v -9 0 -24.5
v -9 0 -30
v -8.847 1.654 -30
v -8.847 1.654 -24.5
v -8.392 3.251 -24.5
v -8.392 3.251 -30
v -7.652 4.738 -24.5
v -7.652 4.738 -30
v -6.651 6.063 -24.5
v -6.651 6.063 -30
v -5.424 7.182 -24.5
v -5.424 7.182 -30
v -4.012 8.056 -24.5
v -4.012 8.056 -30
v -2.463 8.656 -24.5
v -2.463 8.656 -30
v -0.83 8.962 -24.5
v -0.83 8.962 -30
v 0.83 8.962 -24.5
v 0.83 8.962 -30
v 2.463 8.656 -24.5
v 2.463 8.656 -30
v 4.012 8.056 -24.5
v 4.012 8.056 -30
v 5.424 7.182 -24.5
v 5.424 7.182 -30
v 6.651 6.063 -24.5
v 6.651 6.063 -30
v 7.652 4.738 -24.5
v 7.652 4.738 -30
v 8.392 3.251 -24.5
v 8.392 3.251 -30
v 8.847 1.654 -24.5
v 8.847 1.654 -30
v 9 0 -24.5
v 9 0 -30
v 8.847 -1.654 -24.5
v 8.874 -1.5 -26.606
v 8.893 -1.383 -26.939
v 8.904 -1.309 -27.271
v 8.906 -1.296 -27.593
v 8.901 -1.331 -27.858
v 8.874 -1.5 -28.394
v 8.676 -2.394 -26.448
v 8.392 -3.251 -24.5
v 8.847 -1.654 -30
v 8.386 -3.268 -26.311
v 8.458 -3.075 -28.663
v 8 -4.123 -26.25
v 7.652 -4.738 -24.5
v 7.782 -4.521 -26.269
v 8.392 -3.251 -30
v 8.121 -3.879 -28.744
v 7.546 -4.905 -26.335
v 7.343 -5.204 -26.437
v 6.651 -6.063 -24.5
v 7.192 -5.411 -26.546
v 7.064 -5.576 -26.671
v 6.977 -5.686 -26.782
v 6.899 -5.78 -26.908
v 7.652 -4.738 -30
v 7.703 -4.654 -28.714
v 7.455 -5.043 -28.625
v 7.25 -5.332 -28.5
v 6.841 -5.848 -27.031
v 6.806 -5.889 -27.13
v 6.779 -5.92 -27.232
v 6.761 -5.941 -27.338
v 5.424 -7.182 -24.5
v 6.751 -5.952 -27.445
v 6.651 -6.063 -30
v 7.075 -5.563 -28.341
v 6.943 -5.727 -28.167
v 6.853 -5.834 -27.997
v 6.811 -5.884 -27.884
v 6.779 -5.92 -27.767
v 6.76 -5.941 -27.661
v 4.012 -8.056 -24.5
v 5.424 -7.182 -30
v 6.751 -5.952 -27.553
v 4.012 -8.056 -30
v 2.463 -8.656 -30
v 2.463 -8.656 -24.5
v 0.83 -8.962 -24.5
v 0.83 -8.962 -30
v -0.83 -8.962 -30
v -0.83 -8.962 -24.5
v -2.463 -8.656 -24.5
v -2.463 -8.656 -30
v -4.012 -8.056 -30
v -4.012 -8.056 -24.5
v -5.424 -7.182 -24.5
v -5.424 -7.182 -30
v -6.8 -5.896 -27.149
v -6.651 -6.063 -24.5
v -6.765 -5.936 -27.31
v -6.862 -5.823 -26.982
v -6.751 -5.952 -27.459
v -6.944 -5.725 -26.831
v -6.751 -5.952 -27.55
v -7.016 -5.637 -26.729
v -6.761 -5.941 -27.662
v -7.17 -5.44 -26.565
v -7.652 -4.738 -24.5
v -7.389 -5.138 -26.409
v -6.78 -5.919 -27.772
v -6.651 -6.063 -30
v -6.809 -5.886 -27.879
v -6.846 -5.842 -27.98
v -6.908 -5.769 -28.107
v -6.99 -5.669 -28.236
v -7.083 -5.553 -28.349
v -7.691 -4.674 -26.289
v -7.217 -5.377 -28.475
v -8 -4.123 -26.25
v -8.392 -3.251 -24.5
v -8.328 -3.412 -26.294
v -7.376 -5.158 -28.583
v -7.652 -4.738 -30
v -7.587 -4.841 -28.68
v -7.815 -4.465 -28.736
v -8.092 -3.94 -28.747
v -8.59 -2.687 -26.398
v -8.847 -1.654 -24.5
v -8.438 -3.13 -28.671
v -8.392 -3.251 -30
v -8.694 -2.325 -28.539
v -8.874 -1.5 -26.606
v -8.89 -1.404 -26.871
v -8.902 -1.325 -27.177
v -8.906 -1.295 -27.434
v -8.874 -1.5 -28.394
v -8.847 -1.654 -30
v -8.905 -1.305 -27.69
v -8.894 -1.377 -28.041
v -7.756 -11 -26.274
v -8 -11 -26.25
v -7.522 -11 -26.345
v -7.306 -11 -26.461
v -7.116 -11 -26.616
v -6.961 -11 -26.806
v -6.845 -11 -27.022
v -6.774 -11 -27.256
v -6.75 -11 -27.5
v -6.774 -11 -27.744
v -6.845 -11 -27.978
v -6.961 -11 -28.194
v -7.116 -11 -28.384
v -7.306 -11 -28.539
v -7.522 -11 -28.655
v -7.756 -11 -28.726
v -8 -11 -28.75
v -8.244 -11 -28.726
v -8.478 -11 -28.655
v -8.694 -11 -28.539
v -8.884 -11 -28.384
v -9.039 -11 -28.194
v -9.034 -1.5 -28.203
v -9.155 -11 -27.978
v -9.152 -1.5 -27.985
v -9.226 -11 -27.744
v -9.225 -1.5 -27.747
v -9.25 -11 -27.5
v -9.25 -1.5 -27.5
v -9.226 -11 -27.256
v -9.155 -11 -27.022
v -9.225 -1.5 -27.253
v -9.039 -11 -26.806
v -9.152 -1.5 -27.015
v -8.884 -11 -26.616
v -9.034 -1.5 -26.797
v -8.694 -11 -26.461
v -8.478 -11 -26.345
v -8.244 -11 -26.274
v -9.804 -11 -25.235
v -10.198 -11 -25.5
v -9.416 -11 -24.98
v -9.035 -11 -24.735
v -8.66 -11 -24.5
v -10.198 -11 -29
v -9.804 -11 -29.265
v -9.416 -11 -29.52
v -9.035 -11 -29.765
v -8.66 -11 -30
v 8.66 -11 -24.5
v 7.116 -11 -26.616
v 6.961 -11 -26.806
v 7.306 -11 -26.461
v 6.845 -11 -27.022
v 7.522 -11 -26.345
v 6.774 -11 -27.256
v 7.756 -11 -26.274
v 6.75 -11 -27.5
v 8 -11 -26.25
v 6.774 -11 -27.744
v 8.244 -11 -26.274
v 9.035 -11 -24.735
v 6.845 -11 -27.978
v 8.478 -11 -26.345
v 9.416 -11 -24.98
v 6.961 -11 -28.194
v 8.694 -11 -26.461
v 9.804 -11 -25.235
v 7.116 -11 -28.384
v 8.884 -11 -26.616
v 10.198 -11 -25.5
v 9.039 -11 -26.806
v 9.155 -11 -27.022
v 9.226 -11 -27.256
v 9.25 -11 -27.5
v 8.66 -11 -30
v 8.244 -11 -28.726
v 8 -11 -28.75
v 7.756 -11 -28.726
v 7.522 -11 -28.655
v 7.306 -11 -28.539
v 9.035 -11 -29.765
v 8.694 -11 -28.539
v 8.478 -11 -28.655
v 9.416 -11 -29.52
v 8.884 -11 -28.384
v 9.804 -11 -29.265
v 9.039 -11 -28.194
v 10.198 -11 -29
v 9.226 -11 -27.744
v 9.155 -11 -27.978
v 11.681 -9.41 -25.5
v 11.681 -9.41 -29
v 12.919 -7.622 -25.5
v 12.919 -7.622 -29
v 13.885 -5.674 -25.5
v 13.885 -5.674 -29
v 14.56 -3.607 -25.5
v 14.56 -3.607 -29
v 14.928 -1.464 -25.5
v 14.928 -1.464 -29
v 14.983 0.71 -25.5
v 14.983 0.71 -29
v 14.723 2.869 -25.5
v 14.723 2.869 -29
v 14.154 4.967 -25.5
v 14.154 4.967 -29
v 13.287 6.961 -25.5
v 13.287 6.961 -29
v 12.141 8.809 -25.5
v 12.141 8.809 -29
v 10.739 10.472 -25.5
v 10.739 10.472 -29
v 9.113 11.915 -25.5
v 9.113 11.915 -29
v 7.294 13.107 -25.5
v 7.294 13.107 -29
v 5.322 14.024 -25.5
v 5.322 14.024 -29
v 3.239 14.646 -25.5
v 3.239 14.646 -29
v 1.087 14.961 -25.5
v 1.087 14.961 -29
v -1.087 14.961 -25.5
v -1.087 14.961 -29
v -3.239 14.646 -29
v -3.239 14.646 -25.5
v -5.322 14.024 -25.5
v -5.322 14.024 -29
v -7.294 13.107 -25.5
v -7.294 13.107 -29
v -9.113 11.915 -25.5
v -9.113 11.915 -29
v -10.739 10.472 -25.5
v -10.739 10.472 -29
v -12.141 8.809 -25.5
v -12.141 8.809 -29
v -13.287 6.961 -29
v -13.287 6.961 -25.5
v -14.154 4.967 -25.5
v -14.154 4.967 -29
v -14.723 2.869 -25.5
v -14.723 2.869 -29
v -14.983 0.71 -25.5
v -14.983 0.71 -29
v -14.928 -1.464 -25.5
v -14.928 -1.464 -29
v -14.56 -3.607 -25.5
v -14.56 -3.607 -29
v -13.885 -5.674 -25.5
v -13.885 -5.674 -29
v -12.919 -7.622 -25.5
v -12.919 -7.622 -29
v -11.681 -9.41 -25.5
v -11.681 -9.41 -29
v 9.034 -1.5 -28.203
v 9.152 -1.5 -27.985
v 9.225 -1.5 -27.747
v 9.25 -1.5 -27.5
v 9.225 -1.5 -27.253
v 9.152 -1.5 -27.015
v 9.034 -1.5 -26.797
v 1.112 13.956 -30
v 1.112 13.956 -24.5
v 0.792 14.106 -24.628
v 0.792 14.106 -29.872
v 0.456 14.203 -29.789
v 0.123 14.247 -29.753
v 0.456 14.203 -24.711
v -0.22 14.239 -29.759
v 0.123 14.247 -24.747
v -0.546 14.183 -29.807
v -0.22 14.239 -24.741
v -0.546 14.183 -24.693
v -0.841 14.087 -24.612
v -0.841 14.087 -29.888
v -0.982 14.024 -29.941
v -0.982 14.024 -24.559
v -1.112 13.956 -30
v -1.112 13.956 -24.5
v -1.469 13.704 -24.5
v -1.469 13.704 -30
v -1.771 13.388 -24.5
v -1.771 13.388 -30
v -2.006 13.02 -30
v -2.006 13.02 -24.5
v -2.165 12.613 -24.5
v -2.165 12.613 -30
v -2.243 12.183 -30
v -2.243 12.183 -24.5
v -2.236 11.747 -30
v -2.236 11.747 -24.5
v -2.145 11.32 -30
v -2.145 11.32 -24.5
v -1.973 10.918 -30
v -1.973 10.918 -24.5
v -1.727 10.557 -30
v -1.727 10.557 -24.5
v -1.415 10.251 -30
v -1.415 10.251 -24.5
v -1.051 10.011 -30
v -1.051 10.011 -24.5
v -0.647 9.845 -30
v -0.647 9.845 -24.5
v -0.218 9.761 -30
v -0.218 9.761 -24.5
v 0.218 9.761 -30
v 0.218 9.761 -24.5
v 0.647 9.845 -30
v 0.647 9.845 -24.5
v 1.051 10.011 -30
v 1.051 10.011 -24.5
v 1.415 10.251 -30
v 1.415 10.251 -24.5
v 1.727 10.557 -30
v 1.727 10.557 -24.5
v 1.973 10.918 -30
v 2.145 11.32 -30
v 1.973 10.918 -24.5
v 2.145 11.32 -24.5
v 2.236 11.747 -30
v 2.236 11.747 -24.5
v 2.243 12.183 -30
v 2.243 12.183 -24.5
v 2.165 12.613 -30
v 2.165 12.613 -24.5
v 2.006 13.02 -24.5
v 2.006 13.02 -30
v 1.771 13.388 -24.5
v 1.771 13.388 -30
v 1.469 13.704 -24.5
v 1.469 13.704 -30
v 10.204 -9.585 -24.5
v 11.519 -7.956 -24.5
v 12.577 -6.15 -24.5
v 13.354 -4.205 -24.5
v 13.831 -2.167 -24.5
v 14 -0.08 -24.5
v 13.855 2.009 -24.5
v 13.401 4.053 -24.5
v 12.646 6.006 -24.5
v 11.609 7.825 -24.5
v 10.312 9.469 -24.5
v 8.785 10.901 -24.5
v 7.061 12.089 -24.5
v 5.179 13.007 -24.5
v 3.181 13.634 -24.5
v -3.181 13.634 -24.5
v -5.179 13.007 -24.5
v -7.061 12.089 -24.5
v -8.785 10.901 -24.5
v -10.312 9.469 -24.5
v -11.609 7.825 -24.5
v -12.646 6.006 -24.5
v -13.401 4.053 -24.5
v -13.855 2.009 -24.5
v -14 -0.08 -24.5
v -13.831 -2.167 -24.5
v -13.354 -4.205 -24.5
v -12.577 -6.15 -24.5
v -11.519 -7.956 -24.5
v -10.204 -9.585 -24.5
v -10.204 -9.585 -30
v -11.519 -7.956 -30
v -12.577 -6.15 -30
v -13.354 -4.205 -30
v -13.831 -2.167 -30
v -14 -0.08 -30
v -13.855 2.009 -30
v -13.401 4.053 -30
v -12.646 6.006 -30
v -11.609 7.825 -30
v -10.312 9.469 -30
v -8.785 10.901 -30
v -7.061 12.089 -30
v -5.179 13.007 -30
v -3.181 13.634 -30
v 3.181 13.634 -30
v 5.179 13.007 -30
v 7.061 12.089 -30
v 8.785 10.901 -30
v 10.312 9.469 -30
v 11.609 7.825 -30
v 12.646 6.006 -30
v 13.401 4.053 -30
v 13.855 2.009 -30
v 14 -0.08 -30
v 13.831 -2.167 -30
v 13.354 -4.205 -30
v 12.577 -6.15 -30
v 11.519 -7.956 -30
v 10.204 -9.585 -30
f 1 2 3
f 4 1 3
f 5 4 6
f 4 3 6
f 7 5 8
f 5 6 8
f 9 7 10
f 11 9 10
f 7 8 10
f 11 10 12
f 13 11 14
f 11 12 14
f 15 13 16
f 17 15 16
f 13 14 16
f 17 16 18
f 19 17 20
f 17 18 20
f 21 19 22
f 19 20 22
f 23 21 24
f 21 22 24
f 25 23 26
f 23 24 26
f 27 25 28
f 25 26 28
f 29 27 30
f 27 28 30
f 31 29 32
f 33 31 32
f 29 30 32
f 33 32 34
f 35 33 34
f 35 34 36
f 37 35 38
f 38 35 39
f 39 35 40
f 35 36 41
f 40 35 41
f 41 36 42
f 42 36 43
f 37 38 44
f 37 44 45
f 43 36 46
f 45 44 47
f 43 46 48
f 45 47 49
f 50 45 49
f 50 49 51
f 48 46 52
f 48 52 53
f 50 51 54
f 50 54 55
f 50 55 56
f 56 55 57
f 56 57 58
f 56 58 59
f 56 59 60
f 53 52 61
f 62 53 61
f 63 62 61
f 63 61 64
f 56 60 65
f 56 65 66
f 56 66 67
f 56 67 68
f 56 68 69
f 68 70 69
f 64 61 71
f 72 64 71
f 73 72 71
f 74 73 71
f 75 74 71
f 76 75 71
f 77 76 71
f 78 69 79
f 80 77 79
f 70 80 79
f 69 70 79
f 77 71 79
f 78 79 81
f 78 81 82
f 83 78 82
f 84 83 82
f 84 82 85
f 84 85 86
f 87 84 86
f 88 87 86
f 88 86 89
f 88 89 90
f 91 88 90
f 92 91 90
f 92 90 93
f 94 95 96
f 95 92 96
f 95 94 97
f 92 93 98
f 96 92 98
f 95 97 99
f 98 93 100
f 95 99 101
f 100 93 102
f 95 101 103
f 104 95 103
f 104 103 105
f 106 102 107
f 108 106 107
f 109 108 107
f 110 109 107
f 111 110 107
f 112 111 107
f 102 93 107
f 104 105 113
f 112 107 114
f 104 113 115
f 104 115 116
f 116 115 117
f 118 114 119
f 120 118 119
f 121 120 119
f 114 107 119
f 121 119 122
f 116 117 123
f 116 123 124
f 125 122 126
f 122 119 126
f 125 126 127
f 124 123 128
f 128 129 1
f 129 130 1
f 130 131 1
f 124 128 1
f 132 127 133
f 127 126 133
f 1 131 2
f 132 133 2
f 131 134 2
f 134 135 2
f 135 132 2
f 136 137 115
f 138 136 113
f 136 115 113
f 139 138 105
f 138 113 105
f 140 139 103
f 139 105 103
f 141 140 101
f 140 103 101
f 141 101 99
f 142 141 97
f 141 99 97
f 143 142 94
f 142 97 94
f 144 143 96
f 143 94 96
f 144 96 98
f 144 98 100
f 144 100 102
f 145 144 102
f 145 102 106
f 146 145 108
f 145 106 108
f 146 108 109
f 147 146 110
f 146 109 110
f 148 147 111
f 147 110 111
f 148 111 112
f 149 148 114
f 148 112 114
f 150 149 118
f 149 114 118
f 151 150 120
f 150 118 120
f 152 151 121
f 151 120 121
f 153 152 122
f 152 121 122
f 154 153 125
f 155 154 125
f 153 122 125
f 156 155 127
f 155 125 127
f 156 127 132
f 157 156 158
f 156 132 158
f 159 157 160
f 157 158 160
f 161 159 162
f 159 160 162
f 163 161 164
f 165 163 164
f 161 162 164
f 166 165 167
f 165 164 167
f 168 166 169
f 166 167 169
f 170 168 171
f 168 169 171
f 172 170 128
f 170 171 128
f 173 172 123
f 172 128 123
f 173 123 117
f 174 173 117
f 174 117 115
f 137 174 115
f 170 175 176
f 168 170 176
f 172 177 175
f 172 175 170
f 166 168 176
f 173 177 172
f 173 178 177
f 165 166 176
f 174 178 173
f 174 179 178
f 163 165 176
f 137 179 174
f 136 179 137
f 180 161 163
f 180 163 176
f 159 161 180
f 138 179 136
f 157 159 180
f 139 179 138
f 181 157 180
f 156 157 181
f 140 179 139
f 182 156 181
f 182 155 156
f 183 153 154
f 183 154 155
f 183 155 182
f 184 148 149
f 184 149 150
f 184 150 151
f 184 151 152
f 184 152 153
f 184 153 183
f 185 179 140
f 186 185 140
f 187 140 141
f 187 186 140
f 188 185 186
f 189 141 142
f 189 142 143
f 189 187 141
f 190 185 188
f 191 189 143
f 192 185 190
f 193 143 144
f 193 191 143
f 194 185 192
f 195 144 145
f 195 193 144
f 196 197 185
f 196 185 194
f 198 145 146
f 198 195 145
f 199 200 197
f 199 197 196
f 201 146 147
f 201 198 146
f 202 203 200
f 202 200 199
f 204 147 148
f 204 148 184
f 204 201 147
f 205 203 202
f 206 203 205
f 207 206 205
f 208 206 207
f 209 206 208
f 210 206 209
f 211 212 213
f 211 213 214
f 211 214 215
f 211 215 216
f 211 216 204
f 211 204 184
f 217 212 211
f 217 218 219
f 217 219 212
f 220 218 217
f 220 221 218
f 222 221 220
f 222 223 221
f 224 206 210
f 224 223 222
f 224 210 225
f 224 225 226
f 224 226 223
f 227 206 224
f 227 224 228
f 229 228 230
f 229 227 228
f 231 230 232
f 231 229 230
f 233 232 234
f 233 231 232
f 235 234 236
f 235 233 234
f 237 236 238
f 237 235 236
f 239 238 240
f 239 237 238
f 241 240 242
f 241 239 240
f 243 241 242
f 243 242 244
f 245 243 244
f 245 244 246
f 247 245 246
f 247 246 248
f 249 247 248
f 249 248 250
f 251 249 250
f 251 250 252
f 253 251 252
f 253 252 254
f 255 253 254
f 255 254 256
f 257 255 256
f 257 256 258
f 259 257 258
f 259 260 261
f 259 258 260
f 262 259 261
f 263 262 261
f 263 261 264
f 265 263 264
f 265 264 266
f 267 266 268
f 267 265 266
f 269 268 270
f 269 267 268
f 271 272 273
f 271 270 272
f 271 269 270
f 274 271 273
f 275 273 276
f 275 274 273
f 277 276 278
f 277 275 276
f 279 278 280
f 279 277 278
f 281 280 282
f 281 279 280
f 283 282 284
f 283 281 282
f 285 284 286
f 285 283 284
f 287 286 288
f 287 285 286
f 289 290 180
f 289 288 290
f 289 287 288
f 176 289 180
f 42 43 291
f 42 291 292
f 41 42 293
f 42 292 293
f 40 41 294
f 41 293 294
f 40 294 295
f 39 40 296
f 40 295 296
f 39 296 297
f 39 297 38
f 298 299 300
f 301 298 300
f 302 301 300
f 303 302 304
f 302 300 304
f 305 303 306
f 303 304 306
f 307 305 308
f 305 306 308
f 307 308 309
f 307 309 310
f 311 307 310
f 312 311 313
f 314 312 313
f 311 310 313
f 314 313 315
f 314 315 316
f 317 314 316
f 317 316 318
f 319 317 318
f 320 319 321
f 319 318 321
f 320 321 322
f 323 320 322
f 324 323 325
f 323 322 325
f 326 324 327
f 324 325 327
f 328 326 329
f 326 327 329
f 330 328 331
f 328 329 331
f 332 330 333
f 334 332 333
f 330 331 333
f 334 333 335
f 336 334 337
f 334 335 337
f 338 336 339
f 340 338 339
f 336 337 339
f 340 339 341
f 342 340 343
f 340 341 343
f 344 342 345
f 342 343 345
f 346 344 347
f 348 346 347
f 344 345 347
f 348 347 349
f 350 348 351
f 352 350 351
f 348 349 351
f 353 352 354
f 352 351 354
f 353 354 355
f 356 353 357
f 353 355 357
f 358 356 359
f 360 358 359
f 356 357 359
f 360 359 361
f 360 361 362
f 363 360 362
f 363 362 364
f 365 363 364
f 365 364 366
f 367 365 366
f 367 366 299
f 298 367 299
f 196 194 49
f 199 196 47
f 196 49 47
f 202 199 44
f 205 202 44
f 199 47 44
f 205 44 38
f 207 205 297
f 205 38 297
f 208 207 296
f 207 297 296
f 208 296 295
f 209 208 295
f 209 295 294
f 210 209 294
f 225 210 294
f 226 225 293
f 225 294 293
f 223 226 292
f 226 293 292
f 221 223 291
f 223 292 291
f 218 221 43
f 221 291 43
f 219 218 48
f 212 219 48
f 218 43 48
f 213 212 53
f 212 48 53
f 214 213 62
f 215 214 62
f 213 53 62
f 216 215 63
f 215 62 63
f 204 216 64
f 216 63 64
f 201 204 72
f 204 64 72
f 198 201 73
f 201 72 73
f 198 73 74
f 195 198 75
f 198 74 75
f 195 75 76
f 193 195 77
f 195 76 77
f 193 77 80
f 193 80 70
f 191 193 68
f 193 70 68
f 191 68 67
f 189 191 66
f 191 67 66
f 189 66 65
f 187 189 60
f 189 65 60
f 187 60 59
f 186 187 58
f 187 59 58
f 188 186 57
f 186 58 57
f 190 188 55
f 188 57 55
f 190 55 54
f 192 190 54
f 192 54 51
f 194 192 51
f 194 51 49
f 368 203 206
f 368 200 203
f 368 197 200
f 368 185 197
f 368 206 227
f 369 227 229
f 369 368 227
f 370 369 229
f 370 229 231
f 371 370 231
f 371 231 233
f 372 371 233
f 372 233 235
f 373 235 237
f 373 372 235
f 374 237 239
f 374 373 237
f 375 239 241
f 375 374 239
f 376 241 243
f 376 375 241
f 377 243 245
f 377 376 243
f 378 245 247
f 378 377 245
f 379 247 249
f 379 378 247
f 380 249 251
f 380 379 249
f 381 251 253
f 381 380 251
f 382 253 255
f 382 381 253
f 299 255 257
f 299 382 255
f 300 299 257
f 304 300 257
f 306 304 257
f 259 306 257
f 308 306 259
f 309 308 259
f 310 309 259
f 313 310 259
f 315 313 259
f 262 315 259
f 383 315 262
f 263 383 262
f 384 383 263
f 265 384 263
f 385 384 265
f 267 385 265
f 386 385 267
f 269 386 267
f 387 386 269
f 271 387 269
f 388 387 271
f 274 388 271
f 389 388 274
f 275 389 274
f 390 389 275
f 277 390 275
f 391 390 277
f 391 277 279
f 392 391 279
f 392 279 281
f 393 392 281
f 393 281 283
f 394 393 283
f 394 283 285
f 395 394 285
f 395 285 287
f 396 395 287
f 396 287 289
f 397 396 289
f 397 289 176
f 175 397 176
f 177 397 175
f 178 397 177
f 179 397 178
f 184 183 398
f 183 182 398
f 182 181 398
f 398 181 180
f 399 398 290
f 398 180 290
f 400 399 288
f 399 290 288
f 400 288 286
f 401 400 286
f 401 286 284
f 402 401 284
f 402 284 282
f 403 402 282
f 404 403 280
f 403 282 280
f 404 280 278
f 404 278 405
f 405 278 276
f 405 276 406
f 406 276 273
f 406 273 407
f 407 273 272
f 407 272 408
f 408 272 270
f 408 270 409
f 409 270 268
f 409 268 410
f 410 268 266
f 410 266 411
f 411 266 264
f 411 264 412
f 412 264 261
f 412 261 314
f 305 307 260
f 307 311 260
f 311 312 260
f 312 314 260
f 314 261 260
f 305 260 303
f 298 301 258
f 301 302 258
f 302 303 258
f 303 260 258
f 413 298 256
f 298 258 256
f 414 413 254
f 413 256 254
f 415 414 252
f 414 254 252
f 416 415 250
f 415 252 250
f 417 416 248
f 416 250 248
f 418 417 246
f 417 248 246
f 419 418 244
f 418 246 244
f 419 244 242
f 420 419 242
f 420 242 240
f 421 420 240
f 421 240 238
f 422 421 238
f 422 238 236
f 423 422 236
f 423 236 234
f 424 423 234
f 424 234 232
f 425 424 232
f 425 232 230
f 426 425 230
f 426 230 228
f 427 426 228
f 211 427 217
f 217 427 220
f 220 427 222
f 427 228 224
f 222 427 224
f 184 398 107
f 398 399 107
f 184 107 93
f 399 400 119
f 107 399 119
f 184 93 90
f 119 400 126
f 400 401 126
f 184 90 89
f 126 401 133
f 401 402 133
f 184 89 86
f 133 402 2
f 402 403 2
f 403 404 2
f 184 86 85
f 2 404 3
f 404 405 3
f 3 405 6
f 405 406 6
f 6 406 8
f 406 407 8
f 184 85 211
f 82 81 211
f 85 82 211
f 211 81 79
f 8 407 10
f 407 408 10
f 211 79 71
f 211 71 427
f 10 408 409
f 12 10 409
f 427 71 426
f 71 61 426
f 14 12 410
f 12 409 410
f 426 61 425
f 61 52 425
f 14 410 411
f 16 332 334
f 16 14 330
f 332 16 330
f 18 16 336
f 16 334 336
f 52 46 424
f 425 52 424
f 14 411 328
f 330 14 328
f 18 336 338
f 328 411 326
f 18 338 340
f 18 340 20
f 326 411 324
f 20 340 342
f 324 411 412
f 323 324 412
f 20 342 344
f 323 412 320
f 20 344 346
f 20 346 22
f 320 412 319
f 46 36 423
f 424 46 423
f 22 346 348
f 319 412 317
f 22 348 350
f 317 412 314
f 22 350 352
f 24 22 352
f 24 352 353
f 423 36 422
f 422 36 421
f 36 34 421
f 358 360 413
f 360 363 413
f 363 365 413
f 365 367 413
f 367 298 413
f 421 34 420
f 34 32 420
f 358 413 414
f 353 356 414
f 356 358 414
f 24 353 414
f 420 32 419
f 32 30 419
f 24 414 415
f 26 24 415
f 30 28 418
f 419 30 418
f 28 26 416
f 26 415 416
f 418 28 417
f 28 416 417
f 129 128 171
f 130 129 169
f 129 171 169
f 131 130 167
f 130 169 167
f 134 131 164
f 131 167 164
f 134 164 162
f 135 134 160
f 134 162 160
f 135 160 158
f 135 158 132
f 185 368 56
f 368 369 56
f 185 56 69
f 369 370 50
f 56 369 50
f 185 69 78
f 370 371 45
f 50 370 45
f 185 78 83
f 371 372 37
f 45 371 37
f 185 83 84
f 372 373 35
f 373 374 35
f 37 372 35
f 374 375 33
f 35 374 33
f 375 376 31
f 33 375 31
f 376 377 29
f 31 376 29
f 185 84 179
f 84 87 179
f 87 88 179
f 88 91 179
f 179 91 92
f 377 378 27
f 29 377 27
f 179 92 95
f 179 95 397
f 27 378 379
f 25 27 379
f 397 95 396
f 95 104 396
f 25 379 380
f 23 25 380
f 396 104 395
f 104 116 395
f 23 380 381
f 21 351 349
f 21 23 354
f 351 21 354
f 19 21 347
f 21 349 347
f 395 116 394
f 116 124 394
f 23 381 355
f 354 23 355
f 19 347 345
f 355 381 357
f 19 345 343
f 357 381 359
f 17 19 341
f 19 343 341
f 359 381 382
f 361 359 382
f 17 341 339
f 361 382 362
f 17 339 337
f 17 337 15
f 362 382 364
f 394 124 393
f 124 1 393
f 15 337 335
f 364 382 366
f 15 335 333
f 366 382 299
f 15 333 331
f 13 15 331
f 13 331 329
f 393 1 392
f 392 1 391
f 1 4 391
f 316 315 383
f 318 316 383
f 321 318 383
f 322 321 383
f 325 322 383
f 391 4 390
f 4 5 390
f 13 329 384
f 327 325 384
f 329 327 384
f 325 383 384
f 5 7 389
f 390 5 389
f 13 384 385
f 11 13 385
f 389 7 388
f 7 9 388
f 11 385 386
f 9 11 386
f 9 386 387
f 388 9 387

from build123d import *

# Parameters (mm, degrees)
SKETCH_1_R             = 7
SKETCH_1_R_2           = 5.5
EXTRUDE_1_DEPTH        = 30
EXTRUDE_START          = -7
SKETCH_2_R             = 15
SKETCH_2_R_2           = 5.5
EXTRUDE_2_DEPTH        = 7
SKETCH_5_W             = 5.5
SKETCH_5_H             = 9
CUT_EXTRUDE_4_DEPTH    = 15
HOLE_WIZARD_M3_1_D     = 2.5
HOLE_WIZARD_M3_1_DEPTH = 9.5
HOLE_WIZARD_M3_1_TIP   = 0.751075774
FILLET_1_R             = 1
SKETCH1_R              = 7.5
EXTRUDE1_DEPTH         = 5
CHAMFER1_SIZE          = 1
SKETCH_9_R             = 18
CUT_EXTRUDE_1_DEPTH    = 55
SKETCH_10_R            = 9
CUT_EXTRUDE_2_DEPTH    = 22.914607001
CHAMFER_5_SIZE         = 1
SKETCH_11_R            = 2.25
CUT_EXTRUDE_3_DEPTH    = 5.5


with BuildPart() as part:
    # 草图1 → 拉伸1 (new, symmetric)
    with BuildSketch(Plane.XY):
        Circle(SKETCH_1_R)
        Circle(SKETCH_1_R_2, mode=Mode.SUBTRACT)
    extrude(amount=EXTRUDE_1_DEPTH, both=True)

    # 草图2 → 拉伸2 (add)
    with BuildSketch(Plane.XY.offset(30).offset(EXTRUDE_START)):
        Circle(SKETCH_2_R)
        Circle(SKETCH_2_R_2, mode=Mode.SUBTRACT)
    extrude_2 = extrude(amount=EXTRUDE_2_DEPTH)

    # 镜向1: 拉伸2 across plane
    add(extrude_2.mirror(Plane.XY))

    # 草图5 → 拉伸4 (cut, symmetric)
    with BuildSketch(Plane(origin=(0, 0, 0), x_dir=(0, 0, -1), z_dir=(1, 0, 0))):
        with Locations((-27.25, -15.5)):
            Rectangle(SKETCH_5_W, SKETCH_5_H)
        with Locations((27.25, -15.5)):
            Rectangle(SKETCH_5_W, SKETCH_5_H)
    extrude(amount=CUT_EXTRUDE_4_DEPTH, both=True, mode=Mode.SUBTRACT)

    # M3 螺纹孔1
    with Locations(Plane(origin=(-8, -11, 27.5), x_dir=(0, 0, -1), z_dir=(0, -1, 0))):
        with Locations((0, 0), (0, 16), (55, 0), (55, 16)):
            Hole(HOLE_WIZARD_M3_1_D / 2, depth=HOLE_WIZARD_M3_1_DEPTH)
            with Locations((0, 0, -(HOLE_WIZARD_M3_1_DEPTH + HOLE_WIZARD_M3_1_TIP / 2))):  # 118° drill point
                Cone(0, HOLE_WIZARD_M3_1_D / 2, HOLE_WIZARD_M3_1_TIP, mode=Mode.SUBTRACT)

    # 圆角1
    fillet_1_edges = [part.edges().sort_by_distance(p)[0] for p in [
        (-7, 0, -23),
        (-7, 0, 23),
    ]]
    fillet(fillet_1_edges, radius=FILLET_1_R)

    # Sketch1 → Extrude1 (cut)
    with BuildSketch(Plane(origin=(0, 0, 30), x_dir=(-1, 0, 0), z_dir=(0, 0, -1))):
        Circle(SKETCH1_R)
    extrude(amount=EXTRUDE1_DEPTH, mode=Mode.SUBTRACT)

    # Chamfer1
    chamfer1_edges = [part.edges().sort_by_distance(p)[0] for p in [
        (-5.5, 0, 25),
    ]]
    chamfer(chamfer1_edges, length=CHAMFER1_SIZE)

    # 草图9 → 切除-拉伸1 (cut)
    with BuildSketch(Plane(origin=(0, 0, -24.5), x_dir=(-1, 0, 0), z_dir=(0, 0, -1))):
        Circle(SKETCH_9_R)
    extrude(amount=-CUT_EXTRUDE_1_DEPTH, mode=Mode.SUBTRACT)

    # 草图10 → 切除-拉伸2 (cut, through all)
    with BuildSketch(Plane(origin=(0, 0, -30), x_dir=(-1, 0, 0), z_dir=(0, 0, -1))):
        Circle(SKETCH_10_R)
    extrude(amount=-CUT_EXTRUDE_2_DEPTH, mode=Mode.SUBTRACT)

    # 倒角5
    chamfer_5_edges = [part.edges().sort_by_distance(p)[0] for p in [
        (0, 15, -30),
        (0, 15, -24.5),
    ]]
    chamfer(chamfer_5_edges, length=CHAMFER_5_SIZE)

    # 草图11 → 切除-拉伸3 (cut)
    with BuildSketch(Plane.XY.offset(-24.5)):
        with Locations(Location((0, 12, 0), (0, 0, 60.367309199))):
            Circle(SKETCH_11_R)
    extrude(amount=-CUT_EXTRUDE_3_DEPTH, mode=Mode.SUBTRACT)


solid = part.part
